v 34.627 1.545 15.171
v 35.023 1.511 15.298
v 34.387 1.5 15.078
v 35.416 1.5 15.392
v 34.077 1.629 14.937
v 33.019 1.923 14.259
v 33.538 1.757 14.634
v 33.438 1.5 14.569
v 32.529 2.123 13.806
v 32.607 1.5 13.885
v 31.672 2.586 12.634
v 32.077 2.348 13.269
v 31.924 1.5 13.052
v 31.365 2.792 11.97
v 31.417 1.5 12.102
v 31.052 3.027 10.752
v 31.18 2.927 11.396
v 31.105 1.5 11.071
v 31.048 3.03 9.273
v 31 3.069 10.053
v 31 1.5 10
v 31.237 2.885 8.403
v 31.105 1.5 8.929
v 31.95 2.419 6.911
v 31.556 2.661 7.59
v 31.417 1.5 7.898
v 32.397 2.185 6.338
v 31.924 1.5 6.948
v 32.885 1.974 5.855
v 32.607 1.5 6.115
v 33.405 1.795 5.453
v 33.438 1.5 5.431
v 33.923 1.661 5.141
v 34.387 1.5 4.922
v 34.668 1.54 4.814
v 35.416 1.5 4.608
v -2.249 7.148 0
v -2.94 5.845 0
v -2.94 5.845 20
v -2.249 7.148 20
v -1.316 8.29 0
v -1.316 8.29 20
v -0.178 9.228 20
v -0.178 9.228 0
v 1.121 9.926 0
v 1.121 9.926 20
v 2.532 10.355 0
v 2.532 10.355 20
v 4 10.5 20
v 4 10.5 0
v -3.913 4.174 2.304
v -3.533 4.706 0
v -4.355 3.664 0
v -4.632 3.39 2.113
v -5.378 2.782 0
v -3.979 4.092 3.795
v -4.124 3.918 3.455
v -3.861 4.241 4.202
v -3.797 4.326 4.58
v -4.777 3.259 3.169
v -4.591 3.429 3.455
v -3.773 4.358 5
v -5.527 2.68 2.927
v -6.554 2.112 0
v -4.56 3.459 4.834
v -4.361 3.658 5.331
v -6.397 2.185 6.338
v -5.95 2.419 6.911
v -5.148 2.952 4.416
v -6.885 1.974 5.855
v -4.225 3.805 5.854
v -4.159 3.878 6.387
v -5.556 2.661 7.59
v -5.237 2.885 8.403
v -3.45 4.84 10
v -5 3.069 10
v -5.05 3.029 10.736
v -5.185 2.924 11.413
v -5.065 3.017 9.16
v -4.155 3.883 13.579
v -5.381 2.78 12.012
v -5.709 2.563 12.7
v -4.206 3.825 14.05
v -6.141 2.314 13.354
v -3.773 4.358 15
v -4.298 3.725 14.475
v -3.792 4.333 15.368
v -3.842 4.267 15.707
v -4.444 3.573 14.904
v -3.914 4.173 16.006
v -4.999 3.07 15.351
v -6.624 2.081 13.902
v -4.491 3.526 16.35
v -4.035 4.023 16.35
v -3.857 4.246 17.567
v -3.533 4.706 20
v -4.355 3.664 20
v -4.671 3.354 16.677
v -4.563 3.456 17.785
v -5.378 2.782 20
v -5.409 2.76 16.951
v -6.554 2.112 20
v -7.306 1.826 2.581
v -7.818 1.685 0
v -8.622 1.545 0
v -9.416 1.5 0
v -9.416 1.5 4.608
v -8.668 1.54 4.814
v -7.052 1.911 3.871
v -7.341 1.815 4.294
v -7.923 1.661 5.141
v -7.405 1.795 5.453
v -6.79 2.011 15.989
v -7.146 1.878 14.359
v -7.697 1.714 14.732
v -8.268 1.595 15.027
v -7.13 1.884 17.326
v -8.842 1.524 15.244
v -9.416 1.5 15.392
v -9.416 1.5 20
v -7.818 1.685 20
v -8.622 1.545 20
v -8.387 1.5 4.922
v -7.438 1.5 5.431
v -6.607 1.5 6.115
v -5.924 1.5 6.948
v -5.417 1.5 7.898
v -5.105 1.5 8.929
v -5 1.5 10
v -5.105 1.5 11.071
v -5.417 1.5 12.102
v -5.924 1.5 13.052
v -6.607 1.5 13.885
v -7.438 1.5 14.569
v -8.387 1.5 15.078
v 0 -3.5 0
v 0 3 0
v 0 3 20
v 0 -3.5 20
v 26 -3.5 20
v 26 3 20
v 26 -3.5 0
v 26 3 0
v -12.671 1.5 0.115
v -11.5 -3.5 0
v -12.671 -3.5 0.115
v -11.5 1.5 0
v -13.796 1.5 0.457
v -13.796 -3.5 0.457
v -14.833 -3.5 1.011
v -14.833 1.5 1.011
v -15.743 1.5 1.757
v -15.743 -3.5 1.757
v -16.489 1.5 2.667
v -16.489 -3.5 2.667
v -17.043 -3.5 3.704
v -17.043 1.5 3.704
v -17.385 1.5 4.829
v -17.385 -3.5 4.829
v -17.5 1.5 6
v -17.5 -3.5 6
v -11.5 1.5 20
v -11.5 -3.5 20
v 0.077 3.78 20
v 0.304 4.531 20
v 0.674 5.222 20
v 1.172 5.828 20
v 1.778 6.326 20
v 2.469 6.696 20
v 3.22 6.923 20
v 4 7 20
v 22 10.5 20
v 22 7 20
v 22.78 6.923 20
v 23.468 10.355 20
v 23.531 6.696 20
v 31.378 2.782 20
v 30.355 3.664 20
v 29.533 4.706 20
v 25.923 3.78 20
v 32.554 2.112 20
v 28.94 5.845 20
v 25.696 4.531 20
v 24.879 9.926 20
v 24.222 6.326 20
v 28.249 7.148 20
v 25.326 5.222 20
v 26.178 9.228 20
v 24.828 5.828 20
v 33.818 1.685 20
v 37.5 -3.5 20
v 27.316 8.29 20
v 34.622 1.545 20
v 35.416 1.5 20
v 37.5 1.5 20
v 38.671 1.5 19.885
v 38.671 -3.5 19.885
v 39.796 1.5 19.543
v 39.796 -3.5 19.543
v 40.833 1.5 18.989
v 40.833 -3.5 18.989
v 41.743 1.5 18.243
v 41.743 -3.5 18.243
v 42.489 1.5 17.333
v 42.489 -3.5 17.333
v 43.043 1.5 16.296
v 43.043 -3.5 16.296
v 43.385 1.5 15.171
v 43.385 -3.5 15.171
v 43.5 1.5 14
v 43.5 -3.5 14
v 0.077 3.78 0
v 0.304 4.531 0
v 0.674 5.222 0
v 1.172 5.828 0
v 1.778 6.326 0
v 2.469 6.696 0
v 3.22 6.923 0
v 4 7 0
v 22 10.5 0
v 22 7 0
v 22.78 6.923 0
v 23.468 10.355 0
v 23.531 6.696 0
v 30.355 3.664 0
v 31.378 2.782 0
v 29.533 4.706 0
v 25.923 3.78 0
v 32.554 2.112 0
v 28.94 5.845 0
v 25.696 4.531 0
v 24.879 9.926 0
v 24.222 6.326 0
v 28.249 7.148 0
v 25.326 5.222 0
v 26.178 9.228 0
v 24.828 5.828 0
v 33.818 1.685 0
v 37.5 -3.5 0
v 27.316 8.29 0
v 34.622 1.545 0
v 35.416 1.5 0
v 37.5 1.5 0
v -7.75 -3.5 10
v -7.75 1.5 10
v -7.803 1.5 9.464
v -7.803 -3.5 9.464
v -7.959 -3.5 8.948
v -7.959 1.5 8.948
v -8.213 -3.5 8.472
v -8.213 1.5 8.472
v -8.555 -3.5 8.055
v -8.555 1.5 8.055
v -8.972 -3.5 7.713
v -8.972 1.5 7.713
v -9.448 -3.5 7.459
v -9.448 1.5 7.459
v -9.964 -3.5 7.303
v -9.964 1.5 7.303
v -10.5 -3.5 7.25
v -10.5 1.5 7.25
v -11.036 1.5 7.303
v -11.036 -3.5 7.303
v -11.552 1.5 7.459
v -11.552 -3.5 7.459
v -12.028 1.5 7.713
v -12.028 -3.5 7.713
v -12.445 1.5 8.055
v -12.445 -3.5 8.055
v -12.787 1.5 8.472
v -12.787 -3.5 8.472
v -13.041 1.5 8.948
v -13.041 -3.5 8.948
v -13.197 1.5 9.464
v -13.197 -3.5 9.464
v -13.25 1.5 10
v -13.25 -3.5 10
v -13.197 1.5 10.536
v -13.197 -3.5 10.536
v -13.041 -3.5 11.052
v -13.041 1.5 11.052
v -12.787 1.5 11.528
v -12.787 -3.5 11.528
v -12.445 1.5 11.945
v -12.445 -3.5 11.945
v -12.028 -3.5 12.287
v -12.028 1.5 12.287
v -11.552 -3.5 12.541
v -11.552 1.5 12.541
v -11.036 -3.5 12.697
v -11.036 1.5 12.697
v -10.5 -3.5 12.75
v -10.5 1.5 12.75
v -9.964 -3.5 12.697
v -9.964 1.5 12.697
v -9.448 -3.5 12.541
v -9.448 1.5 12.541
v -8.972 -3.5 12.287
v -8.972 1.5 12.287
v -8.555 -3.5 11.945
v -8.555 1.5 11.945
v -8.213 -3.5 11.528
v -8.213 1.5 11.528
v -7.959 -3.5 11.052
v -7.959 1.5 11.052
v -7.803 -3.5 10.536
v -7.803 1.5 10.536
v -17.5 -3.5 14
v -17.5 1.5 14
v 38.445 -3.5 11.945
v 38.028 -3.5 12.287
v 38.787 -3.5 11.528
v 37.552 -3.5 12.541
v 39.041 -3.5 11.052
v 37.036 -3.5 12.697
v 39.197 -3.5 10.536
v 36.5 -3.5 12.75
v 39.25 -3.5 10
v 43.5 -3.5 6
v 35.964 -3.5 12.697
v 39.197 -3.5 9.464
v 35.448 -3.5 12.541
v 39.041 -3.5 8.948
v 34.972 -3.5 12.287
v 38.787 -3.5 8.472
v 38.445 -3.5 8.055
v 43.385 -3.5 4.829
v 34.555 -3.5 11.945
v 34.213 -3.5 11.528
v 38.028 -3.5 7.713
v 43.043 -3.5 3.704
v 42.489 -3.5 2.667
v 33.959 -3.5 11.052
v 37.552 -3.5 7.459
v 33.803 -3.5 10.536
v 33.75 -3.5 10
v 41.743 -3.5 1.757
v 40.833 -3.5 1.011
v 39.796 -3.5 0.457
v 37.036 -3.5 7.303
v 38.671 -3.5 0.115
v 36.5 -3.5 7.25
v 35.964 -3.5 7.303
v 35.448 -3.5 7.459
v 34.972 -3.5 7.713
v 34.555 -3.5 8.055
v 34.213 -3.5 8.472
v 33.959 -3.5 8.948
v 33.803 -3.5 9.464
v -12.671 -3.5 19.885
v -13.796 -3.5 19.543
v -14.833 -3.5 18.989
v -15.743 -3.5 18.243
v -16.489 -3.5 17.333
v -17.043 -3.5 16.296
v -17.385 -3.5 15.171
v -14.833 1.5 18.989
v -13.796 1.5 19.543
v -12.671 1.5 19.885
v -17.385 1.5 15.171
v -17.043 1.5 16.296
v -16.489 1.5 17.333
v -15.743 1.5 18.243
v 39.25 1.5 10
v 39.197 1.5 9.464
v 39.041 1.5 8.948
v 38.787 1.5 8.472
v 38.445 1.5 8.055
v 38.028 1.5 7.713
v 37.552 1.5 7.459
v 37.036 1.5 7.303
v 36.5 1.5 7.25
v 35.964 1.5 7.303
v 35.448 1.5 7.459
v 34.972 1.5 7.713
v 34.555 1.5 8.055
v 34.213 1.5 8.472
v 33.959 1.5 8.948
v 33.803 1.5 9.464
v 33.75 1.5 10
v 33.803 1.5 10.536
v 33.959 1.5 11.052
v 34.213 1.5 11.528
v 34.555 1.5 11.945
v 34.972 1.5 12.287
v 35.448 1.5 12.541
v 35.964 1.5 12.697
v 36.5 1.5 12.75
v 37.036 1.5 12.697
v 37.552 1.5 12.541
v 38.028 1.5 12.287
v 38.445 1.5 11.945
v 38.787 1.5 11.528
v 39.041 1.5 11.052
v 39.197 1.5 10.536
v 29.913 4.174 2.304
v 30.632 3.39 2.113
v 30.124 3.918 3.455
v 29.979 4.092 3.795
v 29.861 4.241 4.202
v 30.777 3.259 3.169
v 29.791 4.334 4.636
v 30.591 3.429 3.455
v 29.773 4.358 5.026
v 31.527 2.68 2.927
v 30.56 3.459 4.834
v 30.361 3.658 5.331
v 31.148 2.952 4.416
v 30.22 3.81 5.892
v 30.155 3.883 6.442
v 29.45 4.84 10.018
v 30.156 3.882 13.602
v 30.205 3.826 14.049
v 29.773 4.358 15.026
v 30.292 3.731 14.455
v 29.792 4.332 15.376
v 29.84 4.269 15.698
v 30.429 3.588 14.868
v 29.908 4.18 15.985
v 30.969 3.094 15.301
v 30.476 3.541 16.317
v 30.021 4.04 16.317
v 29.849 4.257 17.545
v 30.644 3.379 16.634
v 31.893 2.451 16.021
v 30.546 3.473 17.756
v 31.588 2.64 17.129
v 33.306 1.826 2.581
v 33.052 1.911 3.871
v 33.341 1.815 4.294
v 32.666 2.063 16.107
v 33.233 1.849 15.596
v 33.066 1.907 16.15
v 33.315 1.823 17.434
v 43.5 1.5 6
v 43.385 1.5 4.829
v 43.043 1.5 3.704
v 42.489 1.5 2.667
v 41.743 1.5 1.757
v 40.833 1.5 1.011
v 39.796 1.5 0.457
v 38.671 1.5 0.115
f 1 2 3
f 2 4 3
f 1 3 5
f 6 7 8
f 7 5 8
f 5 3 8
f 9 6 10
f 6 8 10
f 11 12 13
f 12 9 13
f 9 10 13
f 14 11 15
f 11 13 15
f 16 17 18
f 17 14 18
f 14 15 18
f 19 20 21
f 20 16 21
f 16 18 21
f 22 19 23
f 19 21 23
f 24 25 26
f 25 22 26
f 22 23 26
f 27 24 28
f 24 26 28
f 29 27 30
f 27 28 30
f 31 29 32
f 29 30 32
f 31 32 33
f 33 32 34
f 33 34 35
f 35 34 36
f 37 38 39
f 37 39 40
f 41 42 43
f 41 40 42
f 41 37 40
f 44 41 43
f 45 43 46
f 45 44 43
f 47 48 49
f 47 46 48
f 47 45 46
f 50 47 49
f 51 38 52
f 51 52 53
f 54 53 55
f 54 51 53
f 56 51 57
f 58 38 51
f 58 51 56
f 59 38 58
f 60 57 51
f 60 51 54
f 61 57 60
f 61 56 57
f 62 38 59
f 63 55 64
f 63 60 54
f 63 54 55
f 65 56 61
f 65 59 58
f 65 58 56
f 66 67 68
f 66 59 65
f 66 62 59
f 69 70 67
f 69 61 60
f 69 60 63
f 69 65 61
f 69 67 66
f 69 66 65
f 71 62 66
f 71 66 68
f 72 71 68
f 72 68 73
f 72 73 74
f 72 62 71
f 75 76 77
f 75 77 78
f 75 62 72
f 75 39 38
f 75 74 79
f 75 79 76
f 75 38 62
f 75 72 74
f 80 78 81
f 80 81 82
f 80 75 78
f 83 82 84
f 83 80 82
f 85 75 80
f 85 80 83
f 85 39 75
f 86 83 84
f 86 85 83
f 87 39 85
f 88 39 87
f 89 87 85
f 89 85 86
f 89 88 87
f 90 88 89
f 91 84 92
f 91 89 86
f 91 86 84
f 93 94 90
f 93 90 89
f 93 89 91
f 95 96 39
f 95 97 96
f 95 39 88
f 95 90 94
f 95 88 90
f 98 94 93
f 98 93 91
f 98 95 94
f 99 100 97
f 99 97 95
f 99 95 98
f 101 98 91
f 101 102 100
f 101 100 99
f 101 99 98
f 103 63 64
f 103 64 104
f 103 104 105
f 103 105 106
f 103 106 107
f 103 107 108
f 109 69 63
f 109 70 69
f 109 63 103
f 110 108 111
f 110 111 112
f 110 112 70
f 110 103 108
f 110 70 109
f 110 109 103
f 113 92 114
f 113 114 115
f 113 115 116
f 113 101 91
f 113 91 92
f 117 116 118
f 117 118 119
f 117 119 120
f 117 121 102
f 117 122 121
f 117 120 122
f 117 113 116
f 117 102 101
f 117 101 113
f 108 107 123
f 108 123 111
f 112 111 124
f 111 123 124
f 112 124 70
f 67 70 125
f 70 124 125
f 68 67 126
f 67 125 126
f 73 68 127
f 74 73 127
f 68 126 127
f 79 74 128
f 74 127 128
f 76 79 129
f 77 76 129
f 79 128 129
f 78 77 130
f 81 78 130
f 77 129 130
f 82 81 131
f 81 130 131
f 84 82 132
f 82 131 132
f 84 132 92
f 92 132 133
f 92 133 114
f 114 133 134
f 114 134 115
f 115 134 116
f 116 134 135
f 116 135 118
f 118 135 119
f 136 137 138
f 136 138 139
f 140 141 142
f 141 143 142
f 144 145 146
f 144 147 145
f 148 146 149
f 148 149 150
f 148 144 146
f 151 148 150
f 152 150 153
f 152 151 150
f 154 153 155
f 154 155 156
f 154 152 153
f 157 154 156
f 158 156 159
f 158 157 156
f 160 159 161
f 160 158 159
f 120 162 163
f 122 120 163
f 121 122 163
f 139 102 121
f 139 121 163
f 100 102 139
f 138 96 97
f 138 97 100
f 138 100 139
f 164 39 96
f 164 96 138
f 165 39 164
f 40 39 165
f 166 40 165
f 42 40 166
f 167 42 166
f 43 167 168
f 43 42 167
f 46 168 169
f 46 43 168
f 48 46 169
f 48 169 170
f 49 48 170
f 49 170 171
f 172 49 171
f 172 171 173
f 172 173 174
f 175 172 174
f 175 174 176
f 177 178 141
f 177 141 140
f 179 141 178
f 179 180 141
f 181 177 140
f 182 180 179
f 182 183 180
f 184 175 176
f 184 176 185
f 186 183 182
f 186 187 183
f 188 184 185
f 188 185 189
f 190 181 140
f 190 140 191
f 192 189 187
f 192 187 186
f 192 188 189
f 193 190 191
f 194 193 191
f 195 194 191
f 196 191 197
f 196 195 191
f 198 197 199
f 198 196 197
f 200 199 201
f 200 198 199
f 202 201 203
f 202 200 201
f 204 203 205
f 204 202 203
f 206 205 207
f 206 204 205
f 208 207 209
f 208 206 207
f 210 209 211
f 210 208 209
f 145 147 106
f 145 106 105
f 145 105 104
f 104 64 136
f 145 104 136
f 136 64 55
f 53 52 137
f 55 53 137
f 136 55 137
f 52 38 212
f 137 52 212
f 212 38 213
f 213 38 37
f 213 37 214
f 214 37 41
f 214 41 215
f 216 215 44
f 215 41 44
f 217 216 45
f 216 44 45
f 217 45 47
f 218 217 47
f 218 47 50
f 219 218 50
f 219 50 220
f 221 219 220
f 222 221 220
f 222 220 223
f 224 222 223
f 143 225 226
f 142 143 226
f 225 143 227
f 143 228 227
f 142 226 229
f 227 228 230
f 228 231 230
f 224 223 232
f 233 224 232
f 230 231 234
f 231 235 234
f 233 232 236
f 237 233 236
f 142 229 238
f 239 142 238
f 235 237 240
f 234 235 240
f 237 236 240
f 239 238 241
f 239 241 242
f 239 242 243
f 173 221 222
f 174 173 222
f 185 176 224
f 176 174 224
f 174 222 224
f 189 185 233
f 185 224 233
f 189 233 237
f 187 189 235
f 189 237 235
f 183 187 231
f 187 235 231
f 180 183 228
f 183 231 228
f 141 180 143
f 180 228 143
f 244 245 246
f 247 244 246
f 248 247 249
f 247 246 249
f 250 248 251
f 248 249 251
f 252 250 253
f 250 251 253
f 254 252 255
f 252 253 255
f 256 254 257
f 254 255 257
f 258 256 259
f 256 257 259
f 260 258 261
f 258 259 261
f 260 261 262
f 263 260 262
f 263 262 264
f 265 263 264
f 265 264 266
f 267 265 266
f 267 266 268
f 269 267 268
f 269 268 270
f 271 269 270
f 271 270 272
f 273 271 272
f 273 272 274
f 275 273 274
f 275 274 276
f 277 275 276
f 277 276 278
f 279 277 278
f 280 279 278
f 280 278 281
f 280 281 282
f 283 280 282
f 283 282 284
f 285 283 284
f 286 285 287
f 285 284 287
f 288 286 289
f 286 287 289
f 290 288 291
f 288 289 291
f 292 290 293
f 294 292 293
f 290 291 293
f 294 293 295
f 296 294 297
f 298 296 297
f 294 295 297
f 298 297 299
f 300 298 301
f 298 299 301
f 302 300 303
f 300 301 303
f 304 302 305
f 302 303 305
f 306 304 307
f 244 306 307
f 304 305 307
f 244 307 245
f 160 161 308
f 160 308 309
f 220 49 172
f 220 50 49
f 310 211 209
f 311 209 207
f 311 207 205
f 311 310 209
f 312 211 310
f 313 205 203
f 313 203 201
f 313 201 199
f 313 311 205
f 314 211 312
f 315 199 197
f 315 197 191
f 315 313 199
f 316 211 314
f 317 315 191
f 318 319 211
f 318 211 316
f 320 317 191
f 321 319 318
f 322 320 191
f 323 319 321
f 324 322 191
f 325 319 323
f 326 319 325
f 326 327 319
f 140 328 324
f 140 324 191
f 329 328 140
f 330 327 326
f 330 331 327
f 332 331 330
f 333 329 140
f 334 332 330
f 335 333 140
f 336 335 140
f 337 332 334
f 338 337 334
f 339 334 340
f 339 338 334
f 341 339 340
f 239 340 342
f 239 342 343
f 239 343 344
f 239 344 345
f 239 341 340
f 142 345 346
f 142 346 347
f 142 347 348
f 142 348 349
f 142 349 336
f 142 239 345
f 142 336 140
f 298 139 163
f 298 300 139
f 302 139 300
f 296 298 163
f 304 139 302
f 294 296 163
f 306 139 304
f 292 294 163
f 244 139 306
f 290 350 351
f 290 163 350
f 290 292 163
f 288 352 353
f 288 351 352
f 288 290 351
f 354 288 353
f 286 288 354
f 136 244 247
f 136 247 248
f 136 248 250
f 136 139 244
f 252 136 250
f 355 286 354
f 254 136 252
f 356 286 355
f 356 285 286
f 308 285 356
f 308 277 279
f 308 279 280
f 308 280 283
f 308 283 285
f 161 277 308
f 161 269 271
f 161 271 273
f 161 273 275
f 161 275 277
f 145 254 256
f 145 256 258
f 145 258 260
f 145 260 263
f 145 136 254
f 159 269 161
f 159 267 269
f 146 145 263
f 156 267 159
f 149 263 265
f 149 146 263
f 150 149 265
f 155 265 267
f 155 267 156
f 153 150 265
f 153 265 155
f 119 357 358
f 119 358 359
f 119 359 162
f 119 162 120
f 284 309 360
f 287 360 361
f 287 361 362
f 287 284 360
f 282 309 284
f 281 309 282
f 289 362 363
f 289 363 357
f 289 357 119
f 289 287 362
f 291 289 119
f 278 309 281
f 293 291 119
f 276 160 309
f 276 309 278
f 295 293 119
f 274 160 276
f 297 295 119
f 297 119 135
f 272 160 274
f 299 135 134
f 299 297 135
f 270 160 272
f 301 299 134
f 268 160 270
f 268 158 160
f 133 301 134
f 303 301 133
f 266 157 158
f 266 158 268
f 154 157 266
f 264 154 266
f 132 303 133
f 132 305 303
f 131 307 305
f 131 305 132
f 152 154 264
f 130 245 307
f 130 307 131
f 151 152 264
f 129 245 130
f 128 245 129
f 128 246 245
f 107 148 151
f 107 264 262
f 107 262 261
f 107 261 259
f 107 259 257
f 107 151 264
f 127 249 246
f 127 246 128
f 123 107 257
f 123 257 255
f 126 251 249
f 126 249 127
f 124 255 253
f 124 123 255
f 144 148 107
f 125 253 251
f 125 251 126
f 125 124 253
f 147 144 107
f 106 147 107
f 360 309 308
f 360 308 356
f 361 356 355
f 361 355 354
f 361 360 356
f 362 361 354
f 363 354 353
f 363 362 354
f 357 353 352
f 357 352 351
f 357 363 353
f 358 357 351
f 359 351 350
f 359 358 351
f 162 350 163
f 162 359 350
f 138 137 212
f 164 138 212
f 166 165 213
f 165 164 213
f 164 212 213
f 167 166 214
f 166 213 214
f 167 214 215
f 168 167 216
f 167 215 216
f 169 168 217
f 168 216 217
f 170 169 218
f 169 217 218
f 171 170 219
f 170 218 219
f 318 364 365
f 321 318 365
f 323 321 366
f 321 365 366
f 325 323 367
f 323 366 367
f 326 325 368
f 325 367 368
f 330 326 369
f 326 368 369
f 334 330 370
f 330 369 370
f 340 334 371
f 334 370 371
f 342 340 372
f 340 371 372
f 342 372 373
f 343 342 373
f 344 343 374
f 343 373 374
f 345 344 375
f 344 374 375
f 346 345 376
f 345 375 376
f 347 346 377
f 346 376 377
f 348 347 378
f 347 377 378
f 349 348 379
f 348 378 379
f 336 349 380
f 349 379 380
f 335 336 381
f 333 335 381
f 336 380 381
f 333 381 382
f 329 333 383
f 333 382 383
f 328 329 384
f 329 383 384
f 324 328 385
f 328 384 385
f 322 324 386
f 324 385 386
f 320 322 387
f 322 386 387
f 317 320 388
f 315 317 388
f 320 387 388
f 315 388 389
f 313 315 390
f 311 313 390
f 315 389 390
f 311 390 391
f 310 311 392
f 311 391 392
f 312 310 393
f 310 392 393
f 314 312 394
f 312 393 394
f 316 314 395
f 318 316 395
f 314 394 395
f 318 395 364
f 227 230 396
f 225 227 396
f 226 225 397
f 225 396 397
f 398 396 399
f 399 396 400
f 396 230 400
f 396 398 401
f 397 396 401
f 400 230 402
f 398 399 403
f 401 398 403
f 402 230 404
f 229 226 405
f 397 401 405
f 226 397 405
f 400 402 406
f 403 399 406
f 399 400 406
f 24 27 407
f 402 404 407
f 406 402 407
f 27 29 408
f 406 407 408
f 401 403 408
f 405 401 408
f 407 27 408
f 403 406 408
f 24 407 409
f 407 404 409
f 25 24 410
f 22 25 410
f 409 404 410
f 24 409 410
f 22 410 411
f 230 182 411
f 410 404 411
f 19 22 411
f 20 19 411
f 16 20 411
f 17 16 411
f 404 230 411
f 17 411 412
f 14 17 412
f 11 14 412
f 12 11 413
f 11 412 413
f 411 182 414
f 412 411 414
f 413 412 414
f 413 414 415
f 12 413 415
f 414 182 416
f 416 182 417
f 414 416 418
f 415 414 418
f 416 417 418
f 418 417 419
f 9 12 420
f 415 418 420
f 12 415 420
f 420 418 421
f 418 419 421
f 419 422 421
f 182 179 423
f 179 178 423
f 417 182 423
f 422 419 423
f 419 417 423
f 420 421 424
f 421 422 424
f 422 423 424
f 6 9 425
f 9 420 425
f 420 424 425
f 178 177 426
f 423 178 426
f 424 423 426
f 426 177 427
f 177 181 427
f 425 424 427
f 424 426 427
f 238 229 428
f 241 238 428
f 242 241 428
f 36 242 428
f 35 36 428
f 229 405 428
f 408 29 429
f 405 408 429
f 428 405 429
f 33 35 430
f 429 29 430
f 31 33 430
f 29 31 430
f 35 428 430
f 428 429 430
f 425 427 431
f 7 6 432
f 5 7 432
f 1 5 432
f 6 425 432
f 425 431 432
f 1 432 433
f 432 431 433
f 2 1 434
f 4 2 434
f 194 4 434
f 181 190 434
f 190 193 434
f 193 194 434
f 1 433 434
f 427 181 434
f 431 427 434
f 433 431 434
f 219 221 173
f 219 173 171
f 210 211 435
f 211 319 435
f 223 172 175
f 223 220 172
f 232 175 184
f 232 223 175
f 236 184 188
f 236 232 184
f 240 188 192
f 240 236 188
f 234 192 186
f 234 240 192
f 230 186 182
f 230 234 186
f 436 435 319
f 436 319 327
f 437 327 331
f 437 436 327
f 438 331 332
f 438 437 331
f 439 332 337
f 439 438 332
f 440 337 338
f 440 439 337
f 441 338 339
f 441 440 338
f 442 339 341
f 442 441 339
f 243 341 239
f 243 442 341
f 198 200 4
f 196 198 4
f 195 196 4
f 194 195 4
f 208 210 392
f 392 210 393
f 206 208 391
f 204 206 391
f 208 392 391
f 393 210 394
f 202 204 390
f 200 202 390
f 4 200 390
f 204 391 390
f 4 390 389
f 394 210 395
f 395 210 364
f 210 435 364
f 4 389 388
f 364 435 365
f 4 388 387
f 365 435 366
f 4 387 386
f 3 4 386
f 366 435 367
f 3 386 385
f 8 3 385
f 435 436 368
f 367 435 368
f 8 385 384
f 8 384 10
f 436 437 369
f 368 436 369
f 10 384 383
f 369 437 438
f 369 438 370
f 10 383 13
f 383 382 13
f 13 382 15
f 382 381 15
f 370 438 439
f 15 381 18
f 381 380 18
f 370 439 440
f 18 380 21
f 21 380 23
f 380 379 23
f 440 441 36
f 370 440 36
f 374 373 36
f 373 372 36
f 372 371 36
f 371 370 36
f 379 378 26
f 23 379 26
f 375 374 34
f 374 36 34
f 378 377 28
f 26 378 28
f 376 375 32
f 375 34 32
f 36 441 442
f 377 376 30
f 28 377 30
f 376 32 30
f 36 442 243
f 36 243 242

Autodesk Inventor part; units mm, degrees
ref_plane "YZ Plane" through (0, 0, 0) normal (1, 0, 0) x (0, 1, 0)
ref_plane "XZ Plane" through (0, 0, 0) normal (0, 1, 0) x (-1, 0, 0)
ref_plane "XY Plane" through (0, 0, 0) normal (0, 0, 1) x (1, 0, 0)
sketch "Sketch1" plane through (0, 0, 0) normal (0, 0, 1) x (1, 0, 0)
  line L0 (0, 0) -> (26, 0)
  line L1 (26, 0) -> (26, 3)
  line L2 (22, 7) -> (4, 7)
  line L3 (0, 3) -> (0, 0)
  arc A0 (4, 7) -> (0, 3) centre (4, 3) ccw
  arc A1 (26, 3) -> (22, 7) centre (22, 3) ccw
  line L4 (4, 10.5) -> (22, 10.5)
  arc A2 (29.5, 3) -> (22, 10.5) centre (22, 3) ccw
  line L5 (29.5, 3) -> (29.5, -3.5)
  line L6 (29.5, -3.5) -> (-3.5, -3.5)
  line L7 (-3.5, -3.5) -> (-3.5, 3)
  arc A3 (4, 10.5) -> (-3.5, 3) centre (4, 3) ccw
  line L8 (0, 0) -> (0, -3.5)
  line L9 (26, 0) -> (26, -3.5)
  line L10 (-3.5, -3.5) -> (-17.5, -3.5)
  line L11 (-17.5, -3.5) -> (-17.5, 1.5)
  line L12 (-17.5, 1.5) -> (-3.5, 1.5)
  line L13 (-3.5, 1.5) -> (-3.5, -3.5)
  line L14 (29.5, -3.5) -> (43.5, -3.5)
  line L15 (43.5, -3.5) -> (43.5, 1.5)
  line L16 (43.5, 1.5) -> (29.5, 1.5)
  line L17 (29.5, 1.5) -> (29.5, -3.5)
  point P0 (26, 7)
  point P1 (0, 7)
  dimension "d0" = 26
  dimension "d1" = 7
  dimension "d2" = 4
  dimension "d3" = 3.5
  dimension "d6" = 14
  dimension "d7" = 5
  dimension "d8" = 14
  dimension "d9" = 5
extrude "Extrusion2" add sketch "Sketch1" along normal blind 20 contours L8 L6 L7 A3 L4 A2 L5 L9 L1 A1 L2 A0 L3 | L10 L11 L12 L7 | L5 L16 L15 L14
fillet "Fillet1" radius 7 2 edges at (29.5, 1.5, 10) (-3.5, 1.5, 10)
fillet "Fillet3" radius 6 4 edges at (-17.5, -1, 20) (-17.5, -1, 0) (43.5, -1, 20) (43.5, -1, 0)
sketch "Sketch2" plane through (35.4164, 1.5, 20) normal (0, 1, 0) x (1, 0, 0)
  circle A0 centre (1.0836, 10) radius 2.75
  line L0 (8.0836, 14) -> (8.0836, 6) projected
  circle A1 centre (1.0836, 10) radius 5.5
  line L1 (-13.4164, 20) -> (-31.4164, 20) projected
  line L2 (-22.4164, 20) -> (-22.4164, 23.3018)
  circle A2 centre (-45.9164, 10) radius 2.75
  circle A3 centre (-45.9164, 10) radius 5.5
  point P0 (-35.4164, 20)
  point P1 (8.0836, 10)
  dimension "d16" = 7
  dimension "d17" = 5.5
  dimension "d18" = 11
extrude "Extrusion3" cut sketch "Sketch2" against normal through all contours A0 | A2
extrude "Extrusion4" cut sketch "Sketch2" along normal through all contours A0 | A1 | A2 | A3
properties part number "large-cable-clip"
